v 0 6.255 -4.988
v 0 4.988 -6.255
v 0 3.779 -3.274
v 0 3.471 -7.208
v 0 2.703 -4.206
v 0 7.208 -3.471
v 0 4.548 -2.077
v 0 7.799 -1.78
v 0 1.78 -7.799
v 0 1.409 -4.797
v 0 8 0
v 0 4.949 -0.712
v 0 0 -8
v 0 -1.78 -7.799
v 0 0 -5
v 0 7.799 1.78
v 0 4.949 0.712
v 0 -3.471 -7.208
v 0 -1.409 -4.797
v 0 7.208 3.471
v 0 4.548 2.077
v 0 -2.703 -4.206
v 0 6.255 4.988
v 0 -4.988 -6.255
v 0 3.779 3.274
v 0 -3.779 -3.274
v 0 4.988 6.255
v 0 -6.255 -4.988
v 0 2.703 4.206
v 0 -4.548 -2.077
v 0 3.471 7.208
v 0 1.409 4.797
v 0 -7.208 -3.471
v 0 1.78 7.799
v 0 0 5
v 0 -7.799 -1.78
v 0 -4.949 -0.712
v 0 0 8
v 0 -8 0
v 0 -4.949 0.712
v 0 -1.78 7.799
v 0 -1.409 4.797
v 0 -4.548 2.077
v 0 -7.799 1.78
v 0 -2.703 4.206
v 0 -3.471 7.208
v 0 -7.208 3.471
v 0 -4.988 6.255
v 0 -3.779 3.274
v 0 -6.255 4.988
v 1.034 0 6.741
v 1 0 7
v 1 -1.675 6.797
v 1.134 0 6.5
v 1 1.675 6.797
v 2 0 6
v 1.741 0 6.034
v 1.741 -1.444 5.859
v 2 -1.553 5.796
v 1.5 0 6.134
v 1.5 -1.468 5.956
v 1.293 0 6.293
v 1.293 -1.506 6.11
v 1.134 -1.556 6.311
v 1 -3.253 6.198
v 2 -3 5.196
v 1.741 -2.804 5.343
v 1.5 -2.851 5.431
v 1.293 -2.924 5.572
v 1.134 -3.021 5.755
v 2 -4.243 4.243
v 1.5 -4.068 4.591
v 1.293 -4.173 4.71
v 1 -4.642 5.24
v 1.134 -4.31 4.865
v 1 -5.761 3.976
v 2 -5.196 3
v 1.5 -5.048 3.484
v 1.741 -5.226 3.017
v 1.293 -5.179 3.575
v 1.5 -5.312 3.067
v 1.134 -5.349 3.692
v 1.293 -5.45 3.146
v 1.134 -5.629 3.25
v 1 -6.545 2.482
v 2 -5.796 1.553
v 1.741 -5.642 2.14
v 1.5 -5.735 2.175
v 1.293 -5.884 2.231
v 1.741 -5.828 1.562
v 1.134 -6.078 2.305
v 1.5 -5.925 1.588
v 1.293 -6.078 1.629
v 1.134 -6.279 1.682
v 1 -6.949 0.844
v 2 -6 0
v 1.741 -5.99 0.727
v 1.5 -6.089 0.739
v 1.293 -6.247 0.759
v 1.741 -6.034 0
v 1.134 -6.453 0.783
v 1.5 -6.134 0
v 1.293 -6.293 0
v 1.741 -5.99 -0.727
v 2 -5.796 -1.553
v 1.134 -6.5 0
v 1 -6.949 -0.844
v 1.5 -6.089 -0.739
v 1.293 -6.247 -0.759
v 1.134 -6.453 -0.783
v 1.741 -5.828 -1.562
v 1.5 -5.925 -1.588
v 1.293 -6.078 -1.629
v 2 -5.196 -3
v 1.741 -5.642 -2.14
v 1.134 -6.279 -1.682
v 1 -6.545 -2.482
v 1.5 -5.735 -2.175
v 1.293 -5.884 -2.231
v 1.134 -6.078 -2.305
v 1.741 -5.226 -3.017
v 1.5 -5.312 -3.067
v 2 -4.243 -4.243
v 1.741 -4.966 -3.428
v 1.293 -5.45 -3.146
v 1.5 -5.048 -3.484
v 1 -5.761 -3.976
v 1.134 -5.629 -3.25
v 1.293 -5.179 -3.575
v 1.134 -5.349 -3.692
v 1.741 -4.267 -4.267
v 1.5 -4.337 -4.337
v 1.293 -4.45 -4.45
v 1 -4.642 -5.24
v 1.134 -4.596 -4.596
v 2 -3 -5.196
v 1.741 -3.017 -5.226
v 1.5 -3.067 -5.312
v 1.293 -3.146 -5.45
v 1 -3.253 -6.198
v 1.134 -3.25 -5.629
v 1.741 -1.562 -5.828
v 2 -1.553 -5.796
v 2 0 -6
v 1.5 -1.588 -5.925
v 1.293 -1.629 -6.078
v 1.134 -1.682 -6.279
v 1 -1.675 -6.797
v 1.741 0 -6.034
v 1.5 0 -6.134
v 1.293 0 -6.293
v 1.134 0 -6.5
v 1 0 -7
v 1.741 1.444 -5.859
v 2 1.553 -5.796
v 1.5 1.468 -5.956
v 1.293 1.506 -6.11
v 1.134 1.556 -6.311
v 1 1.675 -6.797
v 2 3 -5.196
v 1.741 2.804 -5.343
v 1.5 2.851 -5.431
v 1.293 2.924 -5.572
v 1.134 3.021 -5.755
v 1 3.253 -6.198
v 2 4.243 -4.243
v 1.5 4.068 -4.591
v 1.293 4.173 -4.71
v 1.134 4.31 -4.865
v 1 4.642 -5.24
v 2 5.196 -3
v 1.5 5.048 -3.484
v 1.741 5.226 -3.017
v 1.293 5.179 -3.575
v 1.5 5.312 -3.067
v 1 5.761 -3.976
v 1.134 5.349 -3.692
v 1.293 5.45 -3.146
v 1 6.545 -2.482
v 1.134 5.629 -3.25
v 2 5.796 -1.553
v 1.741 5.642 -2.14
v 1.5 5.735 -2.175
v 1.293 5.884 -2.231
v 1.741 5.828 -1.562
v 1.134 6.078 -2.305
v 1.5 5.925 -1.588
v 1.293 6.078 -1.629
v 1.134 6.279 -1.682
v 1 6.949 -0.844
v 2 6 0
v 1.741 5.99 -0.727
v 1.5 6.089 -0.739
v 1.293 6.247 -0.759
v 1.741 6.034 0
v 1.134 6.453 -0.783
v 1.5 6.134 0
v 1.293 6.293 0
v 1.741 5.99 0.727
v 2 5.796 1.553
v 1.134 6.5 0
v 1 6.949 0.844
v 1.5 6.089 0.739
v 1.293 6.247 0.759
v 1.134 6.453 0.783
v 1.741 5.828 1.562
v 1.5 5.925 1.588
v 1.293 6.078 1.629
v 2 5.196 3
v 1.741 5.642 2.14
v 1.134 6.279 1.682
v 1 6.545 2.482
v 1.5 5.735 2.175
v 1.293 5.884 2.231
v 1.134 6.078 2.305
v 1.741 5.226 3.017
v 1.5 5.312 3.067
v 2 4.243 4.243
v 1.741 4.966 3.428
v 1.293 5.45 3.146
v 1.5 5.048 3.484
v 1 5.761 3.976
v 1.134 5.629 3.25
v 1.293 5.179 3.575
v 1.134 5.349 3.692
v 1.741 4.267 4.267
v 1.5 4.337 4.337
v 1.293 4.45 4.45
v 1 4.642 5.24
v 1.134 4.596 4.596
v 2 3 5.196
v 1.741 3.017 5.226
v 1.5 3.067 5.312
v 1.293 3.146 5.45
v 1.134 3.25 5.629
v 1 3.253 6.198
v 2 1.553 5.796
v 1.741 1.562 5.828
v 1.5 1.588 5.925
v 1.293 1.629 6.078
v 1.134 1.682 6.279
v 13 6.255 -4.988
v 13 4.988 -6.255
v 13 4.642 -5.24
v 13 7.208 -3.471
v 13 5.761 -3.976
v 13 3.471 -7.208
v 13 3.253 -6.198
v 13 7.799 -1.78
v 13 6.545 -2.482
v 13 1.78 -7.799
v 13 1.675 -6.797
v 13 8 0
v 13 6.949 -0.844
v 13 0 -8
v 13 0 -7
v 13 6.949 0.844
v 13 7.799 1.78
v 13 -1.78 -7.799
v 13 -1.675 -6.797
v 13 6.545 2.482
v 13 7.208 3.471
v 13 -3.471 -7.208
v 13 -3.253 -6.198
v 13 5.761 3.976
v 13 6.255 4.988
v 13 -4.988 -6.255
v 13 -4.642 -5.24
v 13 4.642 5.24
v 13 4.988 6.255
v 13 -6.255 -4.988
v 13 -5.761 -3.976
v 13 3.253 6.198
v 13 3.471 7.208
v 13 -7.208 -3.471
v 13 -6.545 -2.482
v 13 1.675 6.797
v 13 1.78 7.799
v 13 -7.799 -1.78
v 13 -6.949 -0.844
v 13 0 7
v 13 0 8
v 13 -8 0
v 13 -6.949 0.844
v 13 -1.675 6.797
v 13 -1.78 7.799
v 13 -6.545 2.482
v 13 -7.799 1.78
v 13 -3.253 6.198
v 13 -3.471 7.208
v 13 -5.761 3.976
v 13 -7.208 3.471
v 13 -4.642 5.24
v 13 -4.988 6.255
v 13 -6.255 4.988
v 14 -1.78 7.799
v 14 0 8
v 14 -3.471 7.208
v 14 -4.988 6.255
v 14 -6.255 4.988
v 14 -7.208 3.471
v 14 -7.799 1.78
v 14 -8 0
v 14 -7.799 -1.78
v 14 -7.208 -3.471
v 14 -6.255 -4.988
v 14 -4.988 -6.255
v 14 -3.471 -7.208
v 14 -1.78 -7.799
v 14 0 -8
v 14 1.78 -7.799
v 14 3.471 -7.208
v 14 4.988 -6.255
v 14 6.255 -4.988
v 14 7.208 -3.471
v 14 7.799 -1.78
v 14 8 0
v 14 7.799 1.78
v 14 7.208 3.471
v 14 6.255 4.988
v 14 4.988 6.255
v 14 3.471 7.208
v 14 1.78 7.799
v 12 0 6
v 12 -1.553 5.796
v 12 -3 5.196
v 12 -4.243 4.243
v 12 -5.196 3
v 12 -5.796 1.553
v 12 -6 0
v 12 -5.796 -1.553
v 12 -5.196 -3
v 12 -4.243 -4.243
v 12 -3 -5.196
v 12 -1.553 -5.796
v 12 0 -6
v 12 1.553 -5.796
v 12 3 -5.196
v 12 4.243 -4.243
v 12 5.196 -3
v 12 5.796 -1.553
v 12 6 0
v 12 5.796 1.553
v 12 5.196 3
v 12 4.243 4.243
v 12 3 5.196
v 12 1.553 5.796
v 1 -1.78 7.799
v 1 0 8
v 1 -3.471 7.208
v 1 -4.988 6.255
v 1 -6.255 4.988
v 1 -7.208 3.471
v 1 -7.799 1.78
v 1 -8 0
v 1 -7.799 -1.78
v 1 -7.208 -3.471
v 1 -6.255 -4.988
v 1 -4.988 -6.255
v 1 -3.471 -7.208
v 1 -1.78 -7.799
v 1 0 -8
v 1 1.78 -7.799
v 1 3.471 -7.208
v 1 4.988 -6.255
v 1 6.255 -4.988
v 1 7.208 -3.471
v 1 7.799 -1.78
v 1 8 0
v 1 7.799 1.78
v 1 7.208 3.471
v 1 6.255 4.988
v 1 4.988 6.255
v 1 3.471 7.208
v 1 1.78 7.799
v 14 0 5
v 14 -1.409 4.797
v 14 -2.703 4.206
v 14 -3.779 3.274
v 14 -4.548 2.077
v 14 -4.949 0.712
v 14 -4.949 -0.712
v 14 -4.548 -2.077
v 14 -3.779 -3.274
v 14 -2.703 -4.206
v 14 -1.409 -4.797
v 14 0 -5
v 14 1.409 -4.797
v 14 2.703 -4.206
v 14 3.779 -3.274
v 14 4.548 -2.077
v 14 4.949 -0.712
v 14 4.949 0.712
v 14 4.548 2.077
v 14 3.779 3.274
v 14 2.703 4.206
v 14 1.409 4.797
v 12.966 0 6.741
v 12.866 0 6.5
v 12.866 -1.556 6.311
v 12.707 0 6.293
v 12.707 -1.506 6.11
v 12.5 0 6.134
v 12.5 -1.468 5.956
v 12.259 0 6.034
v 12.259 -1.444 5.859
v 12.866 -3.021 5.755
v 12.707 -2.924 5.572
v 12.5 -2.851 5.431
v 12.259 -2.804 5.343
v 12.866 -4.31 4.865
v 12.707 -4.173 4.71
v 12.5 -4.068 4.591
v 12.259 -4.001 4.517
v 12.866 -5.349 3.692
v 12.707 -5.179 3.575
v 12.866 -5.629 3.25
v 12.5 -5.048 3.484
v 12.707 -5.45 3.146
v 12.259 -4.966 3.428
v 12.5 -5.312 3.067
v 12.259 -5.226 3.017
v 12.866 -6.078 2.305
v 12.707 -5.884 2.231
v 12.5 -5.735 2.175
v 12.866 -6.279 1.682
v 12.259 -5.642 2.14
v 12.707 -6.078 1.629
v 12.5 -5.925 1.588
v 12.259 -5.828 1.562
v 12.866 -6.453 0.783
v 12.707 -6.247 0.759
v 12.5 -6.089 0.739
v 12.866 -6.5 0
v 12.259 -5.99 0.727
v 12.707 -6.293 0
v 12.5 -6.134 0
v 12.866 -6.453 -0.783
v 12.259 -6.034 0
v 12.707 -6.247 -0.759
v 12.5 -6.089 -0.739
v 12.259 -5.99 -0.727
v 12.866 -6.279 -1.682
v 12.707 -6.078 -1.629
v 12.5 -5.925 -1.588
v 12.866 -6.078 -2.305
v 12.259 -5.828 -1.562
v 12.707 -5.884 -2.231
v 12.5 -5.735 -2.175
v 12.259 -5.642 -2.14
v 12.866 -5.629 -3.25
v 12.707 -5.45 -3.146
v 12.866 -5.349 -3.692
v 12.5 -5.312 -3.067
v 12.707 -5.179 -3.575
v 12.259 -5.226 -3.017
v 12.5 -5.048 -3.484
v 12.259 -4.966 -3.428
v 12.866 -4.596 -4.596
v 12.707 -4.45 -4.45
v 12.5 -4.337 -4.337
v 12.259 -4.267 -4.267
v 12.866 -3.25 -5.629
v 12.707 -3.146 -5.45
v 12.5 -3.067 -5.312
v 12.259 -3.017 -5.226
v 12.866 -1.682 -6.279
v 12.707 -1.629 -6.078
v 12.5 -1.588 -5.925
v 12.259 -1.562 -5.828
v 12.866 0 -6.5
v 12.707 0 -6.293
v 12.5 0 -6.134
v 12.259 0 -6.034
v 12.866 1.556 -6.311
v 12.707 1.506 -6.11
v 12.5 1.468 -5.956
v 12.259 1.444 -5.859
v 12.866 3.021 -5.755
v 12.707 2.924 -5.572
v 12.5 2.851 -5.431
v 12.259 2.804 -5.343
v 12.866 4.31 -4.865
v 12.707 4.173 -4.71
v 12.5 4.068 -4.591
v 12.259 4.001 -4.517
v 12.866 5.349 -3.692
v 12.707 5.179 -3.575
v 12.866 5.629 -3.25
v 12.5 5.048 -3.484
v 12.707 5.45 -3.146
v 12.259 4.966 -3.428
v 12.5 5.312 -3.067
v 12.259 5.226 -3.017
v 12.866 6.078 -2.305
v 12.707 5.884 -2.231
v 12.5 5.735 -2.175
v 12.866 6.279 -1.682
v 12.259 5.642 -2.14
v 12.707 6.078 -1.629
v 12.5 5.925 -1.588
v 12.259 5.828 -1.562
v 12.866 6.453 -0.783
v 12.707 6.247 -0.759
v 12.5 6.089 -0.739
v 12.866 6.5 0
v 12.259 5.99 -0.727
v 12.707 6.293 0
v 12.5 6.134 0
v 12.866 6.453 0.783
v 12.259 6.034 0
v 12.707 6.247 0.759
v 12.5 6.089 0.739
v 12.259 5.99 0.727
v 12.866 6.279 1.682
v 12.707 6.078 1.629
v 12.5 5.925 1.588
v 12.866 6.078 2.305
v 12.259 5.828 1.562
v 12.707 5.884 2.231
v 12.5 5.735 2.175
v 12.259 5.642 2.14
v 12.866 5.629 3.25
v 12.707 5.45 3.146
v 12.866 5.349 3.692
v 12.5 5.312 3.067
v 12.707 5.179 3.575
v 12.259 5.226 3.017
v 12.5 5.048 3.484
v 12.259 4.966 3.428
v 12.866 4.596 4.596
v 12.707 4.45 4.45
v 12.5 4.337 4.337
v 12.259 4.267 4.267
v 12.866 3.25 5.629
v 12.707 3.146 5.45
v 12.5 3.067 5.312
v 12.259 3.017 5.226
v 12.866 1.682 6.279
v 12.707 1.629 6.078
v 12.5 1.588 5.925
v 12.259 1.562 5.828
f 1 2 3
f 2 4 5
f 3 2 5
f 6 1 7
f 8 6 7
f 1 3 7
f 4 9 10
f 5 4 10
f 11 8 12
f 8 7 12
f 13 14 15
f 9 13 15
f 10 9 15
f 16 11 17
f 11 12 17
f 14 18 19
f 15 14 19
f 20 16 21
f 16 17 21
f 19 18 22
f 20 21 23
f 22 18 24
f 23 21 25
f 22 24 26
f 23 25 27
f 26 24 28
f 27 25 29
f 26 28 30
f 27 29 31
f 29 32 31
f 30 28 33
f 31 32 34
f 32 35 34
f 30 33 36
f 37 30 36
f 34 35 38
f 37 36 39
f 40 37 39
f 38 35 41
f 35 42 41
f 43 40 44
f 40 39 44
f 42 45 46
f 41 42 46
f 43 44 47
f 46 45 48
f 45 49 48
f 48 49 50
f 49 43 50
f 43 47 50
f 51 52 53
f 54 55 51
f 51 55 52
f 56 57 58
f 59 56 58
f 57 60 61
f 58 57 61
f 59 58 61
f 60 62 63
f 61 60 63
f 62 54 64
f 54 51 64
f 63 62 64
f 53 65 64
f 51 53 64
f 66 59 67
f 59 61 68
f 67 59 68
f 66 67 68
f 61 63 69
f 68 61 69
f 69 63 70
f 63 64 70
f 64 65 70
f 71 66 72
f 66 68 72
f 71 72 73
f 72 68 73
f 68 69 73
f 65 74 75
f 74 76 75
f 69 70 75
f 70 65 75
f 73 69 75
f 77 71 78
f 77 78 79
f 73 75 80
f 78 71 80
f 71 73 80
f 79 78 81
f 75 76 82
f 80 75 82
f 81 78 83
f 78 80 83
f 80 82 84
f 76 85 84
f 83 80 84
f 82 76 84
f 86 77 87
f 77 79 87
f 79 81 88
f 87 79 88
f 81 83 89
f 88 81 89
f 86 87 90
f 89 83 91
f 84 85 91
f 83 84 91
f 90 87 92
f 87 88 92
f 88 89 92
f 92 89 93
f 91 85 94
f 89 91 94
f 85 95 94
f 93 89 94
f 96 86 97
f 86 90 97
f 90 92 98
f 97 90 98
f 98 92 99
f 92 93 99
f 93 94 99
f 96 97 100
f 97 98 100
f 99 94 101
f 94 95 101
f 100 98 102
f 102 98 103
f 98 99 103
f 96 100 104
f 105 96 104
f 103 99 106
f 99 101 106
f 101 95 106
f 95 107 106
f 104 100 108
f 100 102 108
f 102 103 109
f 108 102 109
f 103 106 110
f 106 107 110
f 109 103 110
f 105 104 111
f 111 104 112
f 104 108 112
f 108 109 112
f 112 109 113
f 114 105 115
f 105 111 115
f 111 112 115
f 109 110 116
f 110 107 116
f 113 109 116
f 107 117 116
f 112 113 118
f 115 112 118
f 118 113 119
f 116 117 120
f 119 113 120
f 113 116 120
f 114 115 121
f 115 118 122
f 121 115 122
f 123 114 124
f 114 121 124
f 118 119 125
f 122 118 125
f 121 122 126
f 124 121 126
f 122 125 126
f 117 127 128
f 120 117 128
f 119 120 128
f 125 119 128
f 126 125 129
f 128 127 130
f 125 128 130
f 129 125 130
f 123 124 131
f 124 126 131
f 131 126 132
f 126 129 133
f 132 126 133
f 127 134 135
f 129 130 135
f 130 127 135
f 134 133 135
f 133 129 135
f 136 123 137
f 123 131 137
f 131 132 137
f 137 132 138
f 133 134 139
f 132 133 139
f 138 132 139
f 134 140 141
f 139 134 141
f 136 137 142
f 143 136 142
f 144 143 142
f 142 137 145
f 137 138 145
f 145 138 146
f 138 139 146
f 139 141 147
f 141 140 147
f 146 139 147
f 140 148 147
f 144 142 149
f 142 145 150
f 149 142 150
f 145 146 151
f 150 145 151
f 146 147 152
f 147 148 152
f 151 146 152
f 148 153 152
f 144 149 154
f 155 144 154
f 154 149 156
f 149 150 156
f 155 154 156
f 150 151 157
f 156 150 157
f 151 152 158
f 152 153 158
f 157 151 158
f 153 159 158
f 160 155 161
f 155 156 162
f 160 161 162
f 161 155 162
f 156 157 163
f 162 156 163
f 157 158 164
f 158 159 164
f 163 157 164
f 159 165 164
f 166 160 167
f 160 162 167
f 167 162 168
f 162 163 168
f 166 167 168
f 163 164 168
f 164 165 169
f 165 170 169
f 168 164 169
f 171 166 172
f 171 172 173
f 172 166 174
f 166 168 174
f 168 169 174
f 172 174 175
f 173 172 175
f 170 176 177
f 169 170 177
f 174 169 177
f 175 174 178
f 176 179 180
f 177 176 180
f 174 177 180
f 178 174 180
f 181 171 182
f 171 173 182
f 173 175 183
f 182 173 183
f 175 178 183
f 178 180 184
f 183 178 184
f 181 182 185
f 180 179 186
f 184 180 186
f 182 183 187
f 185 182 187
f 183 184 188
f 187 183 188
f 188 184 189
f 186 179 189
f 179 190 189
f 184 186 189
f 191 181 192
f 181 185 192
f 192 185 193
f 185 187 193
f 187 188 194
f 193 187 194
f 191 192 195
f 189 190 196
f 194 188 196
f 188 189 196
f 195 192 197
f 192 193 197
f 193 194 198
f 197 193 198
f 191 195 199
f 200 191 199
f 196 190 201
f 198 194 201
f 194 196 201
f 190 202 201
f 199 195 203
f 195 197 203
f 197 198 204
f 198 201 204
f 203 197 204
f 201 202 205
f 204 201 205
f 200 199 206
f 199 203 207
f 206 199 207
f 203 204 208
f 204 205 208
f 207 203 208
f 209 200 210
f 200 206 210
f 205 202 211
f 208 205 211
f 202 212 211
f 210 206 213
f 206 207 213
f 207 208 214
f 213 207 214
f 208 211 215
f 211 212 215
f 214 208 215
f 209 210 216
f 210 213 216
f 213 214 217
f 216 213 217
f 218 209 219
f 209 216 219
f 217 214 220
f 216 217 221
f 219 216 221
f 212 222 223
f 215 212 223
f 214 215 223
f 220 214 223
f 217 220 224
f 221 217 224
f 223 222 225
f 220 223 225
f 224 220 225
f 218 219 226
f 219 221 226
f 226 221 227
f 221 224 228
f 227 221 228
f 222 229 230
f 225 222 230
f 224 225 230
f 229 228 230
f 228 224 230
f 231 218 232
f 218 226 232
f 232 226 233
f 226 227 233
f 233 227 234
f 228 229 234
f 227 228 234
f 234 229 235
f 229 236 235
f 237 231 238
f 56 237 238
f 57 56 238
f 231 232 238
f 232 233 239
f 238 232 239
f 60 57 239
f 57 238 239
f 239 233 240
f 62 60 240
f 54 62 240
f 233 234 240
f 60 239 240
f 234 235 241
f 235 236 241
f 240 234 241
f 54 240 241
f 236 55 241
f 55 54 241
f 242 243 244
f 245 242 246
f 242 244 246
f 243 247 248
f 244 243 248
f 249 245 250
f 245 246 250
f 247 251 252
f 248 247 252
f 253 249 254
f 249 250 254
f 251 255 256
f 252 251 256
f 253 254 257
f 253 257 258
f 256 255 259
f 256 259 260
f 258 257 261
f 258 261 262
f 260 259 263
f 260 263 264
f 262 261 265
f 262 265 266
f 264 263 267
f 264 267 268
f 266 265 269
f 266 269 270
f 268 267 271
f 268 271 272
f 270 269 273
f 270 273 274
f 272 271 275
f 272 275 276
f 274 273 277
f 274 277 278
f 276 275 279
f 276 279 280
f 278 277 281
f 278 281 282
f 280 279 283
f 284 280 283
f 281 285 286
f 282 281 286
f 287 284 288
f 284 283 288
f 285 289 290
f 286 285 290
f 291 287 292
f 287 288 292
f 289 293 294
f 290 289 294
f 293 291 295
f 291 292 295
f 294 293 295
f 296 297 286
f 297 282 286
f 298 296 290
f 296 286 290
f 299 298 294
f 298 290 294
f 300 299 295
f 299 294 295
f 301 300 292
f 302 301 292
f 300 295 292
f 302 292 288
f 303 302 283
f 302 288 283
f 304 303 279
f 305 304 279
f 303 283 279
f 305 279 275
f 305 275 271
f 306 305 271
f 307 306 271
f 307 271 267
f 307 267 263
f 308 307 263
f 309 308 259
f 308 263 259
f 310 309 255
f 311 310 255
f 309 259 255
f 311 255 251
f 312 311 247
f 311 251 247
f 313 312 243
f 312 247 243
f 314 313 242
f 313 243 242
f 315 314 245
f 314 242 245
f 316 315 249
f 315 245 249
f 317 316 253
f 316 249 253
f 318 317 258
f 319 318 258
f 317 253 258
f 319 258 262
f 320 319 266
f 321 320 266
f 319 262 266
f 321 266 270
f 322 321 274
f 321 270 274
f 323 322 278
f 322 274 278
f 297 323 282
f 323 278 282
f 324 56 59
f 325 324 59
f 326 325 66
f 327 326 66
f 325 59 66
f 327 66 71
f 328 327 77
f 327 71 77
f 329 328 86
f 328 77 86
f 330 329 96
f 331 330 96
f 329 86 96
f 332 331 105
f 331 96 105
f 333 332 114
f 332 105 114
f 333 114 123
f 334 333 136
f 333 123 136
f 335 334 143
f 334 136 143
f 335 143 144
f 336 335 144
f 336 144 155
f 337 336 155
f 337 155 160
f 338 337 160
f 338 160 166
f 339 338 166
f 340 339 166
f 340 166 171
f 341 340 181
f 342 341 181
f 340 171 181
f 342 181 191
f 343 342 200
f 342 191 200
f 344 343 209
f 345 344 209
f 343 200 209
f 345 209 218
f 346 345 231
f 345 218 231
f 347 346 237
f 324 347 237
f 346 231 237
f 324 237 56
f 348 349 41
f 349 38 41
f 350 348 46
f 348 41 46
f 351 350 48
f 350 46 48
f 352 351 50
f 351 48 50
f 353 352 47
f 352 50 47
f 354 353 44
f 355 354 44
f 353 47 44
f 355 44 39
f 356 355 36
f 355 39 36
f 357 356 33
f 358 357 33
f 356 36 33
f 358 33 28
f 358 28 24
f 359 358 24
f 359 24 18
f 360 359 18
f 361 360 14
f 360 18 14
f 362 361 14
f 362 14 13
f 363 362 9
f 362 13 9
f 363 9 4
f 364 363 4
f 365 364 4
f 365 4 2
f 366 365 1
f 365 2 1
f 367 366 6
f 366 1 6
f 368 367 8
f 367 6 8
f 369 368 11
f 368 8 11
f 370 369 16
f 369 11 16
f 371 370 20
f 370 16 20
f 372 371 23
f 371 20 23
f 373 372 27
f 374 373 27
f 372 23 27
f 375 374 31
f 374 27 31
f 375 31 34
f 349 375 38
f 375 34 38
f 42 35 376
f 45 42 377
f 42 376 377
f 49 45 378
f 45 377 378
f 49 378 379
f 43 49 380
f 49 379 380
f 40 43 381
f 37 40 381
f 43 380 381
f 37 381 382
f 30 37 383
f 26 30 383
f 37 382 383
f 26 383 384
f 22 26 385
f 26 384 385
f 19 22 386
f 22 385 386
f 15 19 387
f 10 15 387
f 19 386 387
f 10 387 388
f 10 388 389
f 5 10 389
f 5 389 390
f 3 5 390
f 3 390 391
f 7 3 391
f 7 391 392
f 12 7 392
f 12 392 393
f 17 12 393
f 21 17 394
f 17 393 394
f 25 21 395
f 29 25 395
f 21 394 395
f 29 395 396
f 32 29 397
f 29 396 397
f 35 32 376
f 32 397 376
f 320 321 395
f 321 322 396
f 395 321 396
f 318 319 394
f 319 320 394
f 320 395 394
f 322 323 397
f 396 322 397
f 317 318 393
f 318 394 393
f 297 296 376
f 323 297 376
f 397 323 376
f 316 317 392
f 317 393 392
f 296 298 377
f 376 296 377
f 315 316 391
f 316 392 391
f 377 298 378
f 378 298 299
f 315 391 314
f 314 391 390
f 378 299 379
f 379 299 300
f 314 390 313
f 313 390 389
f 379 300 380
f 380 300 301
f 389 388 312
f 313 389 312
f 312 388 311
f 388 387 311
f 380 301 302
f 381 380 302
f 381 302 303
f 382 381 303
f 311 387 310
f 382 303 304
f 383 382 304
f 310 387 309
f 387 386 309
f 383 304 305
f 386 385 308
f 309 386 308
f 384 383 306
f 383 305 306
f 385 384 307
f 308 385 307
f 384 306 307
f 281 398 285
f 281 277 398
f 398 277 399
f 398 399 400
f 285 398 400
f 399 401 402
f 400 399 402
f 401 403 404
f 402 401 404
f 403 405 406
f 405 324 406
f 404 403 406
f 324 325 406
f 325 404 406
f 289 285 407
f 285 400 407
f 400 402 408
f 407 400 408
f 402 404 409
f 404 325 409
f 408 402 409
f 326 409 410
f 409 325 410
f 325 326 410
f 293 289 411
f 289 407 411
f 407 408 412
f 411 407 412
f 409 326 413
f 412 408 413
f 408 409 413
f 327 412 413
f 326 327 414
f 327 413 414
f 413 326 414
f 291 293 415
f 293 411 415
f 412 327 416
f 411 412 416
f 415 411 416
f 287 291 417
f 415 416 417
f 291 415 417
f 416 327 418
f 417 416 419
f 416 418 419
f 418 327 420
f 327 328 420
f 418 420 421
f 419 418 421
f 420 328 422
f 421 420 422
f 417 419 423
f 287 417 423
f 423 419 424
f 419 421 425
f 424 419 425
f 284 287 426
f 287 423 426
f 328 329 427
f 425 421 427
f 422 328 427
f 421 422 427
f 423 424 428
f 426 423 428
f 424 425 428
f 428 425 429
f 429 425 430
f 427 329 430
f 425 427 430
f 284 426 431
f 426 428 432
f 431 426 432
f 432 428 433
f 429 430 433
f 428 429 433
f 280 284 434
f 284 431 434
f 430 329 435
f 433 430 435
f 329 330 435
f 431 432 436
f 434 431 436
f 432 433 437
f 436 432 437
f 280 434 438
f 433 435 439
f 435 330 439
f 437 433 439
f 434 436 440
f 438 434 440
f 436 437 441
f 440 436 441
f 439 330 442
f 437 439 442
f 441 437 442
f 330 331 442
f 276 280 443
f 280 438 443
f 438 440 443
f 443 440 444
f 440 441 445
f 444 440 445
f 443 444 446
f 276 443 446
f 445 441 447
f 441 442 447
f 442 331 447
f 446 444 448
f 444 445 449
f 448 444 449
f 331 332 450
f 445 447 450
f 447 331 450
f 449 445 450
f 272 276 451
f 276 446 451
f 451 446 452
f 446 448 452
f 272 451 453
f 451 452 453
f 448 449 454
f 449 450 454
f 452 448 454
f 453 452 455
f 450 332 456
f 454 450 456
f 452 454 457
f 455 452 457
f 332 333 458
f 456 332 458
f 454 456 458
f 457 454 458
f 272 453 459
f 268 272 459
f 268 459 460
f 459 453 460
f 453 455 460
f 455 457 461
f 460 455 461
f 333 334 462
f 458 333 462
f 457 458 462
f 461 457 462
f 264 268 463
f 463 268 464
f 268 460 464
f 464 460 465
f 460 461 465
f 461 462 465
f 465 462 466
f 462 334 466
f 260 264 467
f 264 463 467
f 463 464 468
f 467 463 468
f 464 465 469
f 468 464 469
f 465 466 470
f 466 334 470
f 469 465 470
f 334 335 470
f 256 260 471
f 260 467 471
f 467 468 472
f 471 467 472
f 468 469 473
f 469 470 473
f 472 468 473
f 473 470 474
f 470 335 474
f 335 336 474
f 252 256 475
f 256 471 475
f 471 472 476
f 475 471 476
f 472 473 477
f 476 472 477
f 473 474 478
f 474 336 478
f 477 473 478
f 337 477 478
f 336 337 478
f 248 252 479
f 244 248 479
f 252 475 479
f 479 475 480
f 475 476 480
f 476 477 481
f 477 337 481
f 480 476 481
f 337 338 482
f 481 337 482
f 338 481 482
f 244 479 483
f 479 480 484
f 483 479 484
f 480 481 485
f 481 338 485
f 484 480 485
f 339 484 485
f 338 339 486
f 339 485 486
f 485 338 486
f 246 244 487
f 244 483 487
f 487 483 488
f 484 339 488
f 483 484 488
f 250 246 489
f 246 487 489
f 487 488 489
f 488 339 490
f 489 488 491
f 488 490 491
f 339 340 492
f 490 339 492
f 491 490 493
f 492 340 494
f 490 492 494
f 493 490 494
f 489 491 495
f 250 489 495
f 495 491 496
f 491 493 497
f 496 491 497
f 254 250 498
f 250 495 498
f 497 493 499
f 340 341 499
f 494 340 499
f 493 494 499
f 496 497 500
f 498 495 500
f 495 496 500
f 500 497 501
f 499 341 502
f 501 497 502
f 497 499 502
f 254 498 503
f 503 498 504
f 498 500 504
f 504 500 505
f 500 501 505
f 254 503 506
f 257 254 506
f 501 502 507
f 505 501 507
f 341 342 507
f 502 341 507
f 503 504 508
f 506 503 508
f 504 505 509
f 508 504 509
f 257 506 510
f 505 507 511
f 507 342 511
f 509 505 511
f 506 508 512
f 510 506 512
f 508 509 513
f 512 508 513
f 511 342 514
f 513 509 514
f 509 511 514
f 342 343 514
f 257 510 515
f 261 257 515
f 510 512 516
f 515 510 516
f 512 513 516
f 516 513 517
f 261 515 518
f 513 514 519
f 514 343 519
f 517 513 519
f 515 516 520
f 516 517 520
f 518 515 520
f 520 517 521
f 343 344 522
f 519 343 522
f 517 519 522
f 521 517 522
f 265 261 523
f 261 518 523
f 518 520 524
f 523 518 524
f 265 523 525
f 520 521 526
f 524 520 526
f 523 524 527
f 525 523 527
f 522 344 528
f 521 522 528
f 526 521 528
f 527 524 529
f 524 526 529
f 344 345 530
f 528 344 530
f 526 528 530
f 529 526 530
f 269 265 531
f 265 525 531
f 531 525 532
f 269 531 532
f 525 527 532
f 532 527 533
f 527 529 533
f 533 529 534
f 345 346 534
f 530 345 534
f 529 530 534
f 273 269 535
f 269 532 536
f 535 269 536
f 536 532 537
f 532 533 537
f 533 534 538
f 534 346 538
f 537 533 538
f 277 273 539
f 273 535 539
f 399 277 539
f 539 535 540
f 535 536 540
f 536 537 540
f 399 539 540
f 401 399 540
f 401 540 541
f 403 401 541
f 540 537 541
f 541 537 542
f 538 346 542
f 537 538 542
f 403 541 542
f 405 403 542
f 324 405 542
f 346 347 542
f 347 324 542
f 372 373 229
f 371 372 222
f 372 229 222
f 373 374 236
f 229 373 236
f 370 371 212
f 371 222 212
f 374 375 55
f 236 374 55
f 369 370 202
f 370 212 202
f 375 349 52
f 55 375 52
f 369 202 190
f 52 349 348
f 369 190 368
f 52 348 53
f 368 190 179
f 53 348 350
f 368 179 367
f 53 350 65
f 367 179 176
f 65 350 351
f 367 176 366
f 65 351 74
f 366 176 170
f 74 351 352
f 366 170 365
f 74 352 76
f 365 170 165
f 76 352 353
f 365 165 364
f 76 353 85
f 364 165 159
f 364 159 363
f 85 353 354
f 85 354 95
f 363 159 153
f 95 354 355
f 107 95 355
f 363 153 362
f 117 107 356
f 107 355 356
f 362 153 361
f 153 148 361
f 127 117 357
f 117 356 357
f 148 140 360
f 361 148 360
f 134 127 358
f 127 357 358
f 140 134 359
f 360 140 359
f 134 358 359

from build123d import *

# Parameters (mm, degrees)
FILLET1_R = 1


with BuildPart() as part:
    # Sketch1 → Revolve1 (revolve)
    with BuildSketch(Plane(origin=(0, 0, 0), x_dir=(1, 0, 0), z_dir=(0, 1, 0)), mode=Mode.PRIVATE) as revolve1_sk:
        Polygon((0, 8), (0, 5), (14, 5), (14, 8), (13, 8), (13, 6), (1, 6), (1, 8), align=None)
    revolve(revolve1_sk.sketch.rotate(Axis((0, 0, 0), (1, 0, 0)), 180), axis=Axis((0, 0, 0), (1, 0, 0)))

    # Fillet1
    fillet1_edges = [part.edges().sort_by_distance(p)[0] for p in [
        (1, 0, -6),
        (13, 0, -6),
    ]]
    fillet(fillet1_edges, radius=FILLET1_R)


solid = part.part
